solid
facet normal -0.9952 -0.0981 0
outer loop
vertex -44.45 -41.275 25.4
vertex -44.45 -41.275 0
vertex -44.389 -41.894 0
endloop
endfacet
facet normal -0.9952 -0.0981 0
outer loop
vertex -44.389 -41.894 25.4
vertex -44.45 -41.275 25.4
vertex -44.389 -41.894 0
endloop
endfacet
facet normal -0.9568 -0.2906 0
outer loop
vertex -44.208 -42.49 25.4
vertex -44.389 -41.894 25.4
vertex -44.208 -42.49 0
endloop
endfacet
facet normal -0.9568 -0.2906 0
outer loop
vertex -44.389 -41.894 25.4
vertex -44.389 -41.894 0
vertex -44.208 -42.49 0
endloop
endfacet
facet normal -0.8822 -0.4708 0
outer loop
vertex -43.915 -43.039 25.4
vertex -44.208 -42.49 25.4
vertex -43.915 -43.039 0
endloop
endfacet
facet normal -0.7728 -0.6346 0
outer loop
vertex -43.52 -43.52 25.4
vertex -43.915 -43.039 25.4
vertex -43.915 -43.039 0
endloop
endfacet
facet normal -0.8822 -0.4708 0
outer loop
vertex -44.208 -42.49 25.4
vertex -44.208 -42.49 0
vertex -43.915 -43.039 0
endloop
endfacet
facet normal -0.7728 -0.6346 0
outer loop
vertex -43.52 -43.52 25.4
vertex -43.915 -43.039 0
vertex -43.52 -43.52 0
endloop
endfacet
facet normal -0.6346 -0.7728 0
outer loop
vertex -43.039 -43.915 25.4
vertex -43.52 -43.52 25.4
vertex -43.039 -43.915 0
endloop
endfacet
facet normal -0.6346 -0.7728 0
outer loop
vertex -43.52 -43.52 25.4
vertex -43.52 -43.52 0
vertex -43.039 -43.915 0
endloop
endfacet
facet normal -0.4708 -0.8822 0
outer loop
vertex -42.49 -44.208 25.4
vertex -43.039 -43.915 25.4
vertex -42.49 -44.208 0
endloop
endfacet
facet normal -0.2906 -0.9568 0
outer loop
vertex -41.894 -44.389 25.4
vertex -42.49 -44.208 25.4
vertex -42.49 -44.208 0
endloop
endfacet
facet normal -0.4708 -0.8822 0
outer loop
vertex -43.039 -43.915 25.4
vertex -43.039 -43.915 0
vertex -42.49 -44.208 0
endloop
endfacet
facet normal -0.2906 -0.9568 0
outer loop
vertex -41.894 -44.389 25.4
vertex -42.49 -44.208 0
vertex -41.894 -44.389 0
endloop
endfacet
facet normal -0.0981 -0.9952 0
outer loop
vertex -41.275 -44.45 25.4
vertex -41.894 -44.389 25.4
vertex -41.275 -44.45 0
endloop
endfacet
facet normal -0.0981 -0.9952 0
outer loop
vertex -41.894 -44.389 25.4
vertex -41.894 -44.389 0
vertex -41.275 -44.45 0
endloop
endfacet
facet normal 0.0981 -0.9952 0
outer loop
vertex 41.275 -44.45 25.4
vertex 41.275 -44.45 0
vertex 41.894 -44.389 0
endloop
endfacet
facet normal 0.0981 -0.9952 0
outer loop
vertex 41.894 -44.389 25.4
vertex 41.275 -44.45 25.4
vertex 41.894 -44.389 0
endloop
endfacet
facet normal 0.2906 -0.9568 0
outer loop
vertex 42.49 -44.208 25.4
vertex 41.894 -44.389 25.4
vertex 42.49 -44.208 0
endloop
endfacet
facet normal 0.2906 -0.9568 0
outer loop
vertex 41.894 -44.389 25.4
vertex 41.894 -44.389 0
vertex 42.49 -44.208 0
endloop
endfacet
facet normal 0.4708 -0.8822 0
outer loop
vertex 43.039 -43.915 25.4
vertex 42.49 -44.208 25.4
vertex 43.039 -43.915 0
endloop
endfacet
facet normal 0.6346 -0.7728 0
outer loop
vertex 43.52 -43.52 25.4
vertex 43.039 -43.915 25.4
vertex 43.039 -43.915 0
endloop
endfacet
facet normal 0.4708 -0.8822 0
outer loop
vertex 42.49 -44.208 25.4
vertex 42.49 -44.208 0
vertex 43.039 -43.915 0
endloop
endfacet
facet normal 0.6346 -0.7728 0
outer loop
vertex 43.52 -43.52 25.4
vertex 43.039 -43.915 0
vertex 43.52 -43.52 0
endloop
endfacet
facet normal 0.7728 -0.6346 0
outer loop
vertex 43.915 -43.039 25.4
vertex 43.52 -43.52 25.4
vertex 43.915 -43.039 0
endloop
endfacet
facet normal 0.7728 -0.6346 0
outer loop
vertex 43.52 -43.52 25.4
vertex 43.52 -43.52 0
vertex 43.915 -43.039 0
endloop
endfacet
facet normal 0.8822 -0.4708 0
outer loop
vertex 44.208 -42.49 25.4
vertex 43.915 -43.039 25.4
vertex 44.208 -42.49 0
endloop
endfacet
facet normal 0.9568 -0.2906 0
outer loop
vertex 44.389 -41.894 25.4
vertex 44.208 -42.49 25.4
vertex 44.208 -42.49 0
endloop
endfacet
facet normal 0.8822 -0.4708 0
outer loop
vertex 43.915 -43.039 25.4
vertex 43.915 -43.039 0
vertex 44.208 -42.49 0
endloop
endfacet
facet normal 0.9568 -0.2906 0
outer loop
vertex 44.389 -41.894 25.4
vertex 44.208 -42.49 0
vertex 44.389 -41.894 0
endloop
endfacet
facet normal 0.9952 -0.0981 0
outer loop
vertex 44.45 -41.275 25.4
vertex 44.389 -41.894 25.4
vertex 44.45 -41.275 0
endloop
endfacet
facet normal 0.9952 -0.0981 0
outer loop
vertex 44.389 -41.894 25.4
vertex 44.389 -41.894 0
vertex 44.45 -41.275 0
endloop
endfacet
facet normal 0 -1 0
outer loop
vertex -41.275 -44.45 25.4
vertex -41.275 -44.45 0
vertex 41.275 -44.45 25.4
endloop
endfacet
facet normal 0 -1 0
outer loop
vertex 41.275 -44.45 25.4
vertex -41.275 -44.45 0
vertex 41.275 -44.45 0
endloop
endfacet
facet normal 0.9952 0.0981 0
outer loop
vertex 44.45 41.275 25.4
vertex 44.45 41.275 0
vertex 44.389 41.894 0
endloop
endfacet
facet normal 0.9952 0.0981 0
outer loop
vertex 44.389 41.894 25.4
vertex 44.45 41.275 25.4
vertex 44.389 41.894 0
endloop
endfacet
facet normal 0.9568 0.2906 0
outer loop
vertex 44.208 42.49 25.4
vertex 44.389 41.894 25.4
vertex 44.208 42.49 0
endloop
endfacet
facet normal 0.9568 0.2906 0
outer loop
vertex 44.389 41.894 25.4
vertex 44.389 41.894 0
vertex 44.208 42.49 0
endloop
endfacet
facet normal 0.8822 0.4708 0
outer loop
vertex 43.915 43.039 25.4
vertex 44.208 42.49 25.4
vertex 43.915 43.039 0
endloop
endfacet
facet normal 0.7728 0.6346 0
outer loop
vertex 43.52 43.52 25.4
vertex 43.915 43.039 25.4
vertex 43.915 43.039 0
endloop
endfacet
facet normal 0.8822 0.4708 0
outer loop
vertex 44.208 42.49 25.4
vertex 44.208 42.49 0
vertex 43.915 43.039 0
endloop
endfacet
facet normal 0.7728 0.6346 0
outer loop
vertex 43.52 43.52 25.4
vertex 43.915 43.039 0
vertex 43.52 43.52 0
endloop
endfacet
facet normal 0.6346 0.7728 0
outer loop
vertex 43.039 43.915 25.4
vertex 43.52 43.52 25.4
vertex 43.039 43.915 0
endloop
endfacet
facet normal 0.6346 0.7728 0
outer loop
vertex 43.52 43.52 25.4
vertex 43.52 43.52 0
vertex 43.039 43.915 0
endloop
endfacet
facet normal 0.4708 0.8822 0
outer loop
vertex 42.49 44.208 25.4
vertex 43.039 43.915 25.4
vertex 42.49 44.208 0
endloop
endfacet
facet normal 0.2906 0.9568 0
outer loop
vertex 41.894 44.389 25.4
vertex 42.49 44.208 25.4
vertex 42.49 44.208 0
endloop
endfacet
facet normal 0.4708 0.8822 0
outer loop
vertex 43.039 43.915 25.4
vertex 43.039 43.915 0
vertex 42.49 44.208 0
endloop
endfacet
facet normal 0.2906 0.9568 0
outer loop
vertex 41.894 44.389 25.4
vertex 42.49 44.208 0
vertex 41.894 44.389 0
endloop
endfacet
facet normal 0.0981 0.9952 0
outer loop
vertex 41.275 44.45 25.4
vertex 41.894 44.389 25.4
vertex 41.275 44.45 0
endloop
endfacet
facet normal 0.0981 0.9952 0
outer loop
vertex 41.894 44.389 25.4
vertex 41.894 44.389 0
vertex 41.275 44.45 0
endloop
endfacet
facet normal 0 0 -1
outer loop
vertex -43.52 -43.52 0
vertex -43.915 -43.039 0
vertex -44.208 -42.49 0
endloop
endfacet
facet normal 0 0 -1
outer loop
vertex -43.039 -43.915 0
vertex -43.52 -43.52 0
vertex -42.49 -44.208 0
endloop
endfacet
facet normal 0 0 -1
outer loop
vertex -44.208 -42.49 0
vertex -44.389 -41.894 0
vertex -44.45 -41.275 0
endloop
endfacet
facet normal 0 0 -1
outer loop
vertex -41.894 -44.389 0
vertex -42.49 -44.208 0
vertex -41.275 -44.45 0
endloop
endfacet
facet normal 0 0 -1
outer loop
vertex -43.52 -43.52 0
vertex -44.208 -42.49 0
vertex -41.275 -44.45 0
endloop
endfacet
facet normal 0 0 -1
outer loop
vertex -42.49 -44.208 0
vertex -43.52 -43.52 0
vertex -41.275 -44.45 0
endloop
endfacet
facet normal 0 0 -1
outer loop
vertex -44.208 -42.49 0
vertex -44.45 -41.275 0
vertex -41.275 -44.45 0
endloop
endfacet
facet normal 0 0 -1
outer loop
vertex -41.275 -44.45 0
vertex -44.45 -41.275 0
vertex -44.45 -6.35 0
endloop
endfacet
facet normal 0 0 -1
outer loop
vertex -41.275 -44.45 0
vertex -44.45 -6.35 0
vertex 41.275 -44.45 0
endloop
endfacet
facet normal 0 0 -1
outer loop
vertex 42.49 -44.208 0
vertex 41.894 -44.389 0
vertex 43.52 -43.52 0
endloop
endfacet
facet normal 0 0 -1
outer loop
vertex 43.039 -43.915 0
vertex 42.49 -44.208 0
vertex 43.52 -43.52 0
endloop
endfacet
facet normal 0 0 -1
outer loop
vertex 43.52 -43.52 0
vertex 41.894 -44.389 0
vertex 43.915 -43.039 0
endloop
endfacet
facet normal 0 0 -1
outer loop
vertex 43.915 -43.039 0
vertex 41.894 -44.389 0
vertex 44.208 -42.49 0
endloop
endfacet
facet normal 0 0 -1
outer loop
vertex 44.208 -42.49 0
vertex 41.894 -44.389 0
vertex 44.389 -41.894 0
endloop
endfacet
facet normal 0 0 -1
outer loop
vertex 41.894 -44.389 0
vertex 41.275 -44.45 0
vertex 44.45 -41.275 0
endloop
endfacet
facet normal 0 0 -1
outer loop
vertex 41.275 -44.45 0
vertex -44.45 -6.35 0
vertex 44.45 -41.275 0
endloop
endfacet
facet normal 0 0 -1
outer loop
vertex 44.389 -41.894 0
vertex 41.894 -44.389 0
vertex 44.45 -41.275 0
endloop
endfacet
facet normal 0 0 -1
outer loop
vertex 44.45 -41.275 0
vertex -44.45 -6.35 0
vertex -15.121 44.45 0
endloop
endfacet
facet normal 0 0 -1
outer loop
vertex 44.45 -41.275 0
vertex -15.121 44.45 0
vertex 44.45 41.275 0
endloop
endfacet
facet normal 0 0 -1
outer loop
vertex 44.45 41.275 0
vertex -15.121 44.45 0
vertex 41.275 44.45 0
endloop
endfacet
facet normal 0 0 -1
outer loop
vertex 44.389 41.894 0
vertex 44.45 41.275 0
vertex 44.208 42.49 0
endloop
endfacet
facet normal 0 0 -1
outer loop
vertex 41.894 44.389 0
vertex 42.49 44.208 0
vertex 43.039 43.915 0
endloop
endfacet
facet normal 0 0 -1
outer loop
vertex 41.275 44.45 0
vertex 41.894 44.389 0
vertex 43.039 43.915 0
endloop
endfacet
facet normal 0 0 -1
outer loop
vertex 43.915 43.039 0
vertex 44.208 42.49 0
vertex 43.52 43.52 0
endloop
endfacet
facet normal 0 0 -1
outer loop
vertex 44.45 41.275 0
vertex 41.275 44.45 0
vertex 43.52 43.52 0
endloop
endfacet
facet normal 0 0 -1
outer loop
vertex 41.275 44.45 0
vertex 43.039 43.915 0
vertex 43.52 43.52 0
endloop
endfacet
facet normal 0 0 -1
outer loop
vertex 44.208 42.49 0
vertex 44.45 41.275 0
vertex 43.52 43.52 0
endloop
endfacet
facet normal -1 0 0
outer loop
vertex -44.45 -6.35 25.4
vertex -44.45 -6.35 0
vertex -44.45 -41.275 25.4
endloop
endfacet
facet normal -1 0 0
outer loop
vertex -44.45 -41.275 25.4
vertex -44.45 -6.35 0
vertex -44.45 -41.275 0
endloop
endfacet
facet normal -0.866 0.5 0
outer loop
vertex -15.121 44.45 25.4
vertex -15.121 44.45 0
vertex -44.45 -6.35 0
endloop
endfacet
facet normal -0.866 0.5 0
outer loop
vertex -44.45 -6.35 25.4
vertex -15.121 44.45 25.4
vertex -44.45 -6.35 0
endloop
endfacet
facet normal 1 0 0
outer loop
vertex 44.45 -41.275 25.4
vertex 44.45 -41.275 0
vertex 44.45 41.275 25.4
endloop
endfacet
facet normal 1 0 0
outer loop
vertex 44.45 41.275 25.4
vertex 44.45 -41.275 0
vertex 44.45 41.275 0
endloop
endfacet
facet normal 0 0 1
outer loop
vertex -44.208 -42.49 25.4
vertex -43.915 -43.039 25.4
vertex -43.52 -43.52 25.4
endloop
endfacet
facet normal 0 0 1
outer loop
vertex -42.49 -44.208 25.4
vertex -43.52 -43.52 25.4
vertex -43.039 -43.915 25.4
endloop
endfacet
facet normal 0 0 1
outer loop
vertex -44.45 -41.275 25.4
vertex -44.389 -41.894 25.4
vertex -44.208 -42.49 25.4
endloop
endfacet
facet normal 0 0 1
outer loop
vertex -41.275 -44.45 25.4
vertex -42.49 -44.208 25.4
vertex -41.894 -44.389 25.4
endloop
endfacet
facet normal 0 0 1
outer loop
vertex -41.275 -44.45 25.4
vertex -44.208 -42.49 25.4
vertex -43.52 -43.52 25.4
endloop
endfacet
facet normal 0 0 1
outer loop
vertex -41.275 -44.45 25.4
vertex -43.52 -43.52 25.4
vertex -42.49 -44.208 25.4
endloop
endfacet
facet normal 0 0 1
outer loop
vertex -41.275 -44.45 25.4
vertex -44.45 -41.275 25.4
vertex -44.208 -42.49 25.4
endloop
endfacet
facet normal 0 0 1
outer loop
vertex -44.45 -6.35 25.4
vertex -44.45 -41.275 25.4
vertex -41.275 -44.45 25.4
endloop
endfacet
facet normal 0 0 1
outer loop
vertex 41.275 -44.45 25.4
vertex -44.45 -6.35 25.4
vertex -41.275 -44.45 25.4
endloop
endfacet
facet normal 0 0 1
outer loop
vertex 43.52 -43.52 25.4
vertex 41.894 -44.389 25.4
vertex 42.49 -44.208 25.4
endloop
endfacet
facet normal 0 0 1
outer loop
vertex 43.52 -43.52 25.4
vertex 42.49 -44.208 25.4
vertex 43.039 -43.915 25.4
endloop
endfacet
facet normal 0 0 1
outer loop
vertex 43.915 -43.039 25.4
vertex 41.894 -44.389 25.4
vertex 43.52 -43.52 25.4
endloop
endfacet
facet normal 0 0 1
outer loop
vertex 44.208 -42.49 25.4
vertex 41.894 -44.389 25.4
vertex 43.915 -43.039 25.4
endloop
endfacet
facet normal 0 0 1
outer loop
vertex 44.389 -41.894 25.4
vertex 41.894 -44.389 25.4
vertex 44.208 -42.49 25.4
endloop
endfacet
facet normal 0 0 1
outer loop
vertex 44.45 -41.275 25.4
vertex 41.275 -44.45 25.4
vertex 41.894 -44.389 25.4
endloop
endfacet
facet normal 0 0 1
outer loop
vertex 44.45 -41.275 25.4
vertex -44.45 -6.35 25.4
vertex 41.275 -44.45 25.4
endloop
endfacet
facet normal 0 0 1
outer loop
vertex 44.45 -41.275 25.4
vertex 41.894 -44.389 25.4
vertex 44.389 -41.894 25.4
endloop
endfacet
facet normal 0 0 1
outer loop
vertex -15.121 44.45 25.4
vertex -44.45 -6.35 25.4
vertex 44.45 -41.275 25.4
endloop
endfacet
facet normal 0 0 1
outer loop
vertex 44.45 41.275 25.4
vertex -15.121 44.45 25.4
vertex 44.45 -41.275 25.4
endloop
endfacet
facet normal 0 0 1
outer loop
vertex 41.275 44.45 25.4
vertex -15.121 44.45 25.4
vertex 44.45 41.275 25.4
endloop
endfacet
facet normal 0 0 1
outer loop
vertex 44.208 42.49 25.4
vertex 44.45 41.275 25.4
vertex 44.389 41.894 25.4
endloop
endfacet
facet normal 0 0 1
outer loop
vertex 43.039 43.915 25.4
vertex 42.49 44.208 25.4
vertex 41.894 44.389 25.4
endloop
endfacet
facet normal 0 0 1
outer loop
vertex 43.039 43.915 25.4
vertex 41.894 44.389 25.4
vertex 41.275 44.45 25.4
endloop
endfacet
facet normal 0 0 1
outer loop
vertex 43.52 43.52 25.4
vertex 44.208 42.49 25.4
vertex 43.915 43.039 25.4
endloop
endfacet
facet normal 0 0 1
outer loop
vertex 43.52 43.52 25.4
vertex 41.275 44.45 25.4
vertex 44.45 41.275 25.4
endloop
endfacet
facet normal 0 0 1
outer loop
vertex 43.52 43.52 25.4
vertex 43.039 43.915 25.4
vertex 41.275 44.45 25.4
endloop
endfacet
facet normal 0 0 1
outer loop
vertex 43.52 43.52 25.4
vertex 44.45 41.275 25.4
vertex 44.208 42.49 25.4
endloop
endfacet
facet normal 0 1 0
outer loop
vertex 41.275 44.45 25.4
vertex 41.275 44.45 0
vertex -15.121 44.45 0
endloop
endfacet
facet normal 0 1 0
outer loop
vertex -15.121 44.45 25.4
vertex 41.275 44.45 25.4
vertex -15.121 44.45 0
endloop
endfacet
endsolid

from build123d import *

# Parameters (mm, degrees)
F1_DEPTH = 25.4


with BuildPart() as f1:
    # F0 (on Top) → F1 (new body)
    with BuildSketch(Plane.XY):
        with BuildLine():
            ThreePointArc((44.45, 41.275), (43.520064, 43.520064), (41.275, 44.45))
            Line((41.275, 44.45), (-15.120606, 44.45))
            Line((-15.120606, 44.45), (-44.45, -6.35))
            Line((-44.45, -6.35), (-44.45, -41.275))
            ThreePointArc((-44.45, -41.275), (-43.520064, -43.520064), (-41.275, -44.45))
            Line((-41.275, -44.45), (41.275, -44.45))
            ThreePointArc((41.275, -44.45), (43.520064, -43.520064), (44.45, -41.275))
            Line((44.45, -41.275), (44.45, 41.275))
        make_face()
    extrude(amount=F1_DEPTH)


solid = f1.part
